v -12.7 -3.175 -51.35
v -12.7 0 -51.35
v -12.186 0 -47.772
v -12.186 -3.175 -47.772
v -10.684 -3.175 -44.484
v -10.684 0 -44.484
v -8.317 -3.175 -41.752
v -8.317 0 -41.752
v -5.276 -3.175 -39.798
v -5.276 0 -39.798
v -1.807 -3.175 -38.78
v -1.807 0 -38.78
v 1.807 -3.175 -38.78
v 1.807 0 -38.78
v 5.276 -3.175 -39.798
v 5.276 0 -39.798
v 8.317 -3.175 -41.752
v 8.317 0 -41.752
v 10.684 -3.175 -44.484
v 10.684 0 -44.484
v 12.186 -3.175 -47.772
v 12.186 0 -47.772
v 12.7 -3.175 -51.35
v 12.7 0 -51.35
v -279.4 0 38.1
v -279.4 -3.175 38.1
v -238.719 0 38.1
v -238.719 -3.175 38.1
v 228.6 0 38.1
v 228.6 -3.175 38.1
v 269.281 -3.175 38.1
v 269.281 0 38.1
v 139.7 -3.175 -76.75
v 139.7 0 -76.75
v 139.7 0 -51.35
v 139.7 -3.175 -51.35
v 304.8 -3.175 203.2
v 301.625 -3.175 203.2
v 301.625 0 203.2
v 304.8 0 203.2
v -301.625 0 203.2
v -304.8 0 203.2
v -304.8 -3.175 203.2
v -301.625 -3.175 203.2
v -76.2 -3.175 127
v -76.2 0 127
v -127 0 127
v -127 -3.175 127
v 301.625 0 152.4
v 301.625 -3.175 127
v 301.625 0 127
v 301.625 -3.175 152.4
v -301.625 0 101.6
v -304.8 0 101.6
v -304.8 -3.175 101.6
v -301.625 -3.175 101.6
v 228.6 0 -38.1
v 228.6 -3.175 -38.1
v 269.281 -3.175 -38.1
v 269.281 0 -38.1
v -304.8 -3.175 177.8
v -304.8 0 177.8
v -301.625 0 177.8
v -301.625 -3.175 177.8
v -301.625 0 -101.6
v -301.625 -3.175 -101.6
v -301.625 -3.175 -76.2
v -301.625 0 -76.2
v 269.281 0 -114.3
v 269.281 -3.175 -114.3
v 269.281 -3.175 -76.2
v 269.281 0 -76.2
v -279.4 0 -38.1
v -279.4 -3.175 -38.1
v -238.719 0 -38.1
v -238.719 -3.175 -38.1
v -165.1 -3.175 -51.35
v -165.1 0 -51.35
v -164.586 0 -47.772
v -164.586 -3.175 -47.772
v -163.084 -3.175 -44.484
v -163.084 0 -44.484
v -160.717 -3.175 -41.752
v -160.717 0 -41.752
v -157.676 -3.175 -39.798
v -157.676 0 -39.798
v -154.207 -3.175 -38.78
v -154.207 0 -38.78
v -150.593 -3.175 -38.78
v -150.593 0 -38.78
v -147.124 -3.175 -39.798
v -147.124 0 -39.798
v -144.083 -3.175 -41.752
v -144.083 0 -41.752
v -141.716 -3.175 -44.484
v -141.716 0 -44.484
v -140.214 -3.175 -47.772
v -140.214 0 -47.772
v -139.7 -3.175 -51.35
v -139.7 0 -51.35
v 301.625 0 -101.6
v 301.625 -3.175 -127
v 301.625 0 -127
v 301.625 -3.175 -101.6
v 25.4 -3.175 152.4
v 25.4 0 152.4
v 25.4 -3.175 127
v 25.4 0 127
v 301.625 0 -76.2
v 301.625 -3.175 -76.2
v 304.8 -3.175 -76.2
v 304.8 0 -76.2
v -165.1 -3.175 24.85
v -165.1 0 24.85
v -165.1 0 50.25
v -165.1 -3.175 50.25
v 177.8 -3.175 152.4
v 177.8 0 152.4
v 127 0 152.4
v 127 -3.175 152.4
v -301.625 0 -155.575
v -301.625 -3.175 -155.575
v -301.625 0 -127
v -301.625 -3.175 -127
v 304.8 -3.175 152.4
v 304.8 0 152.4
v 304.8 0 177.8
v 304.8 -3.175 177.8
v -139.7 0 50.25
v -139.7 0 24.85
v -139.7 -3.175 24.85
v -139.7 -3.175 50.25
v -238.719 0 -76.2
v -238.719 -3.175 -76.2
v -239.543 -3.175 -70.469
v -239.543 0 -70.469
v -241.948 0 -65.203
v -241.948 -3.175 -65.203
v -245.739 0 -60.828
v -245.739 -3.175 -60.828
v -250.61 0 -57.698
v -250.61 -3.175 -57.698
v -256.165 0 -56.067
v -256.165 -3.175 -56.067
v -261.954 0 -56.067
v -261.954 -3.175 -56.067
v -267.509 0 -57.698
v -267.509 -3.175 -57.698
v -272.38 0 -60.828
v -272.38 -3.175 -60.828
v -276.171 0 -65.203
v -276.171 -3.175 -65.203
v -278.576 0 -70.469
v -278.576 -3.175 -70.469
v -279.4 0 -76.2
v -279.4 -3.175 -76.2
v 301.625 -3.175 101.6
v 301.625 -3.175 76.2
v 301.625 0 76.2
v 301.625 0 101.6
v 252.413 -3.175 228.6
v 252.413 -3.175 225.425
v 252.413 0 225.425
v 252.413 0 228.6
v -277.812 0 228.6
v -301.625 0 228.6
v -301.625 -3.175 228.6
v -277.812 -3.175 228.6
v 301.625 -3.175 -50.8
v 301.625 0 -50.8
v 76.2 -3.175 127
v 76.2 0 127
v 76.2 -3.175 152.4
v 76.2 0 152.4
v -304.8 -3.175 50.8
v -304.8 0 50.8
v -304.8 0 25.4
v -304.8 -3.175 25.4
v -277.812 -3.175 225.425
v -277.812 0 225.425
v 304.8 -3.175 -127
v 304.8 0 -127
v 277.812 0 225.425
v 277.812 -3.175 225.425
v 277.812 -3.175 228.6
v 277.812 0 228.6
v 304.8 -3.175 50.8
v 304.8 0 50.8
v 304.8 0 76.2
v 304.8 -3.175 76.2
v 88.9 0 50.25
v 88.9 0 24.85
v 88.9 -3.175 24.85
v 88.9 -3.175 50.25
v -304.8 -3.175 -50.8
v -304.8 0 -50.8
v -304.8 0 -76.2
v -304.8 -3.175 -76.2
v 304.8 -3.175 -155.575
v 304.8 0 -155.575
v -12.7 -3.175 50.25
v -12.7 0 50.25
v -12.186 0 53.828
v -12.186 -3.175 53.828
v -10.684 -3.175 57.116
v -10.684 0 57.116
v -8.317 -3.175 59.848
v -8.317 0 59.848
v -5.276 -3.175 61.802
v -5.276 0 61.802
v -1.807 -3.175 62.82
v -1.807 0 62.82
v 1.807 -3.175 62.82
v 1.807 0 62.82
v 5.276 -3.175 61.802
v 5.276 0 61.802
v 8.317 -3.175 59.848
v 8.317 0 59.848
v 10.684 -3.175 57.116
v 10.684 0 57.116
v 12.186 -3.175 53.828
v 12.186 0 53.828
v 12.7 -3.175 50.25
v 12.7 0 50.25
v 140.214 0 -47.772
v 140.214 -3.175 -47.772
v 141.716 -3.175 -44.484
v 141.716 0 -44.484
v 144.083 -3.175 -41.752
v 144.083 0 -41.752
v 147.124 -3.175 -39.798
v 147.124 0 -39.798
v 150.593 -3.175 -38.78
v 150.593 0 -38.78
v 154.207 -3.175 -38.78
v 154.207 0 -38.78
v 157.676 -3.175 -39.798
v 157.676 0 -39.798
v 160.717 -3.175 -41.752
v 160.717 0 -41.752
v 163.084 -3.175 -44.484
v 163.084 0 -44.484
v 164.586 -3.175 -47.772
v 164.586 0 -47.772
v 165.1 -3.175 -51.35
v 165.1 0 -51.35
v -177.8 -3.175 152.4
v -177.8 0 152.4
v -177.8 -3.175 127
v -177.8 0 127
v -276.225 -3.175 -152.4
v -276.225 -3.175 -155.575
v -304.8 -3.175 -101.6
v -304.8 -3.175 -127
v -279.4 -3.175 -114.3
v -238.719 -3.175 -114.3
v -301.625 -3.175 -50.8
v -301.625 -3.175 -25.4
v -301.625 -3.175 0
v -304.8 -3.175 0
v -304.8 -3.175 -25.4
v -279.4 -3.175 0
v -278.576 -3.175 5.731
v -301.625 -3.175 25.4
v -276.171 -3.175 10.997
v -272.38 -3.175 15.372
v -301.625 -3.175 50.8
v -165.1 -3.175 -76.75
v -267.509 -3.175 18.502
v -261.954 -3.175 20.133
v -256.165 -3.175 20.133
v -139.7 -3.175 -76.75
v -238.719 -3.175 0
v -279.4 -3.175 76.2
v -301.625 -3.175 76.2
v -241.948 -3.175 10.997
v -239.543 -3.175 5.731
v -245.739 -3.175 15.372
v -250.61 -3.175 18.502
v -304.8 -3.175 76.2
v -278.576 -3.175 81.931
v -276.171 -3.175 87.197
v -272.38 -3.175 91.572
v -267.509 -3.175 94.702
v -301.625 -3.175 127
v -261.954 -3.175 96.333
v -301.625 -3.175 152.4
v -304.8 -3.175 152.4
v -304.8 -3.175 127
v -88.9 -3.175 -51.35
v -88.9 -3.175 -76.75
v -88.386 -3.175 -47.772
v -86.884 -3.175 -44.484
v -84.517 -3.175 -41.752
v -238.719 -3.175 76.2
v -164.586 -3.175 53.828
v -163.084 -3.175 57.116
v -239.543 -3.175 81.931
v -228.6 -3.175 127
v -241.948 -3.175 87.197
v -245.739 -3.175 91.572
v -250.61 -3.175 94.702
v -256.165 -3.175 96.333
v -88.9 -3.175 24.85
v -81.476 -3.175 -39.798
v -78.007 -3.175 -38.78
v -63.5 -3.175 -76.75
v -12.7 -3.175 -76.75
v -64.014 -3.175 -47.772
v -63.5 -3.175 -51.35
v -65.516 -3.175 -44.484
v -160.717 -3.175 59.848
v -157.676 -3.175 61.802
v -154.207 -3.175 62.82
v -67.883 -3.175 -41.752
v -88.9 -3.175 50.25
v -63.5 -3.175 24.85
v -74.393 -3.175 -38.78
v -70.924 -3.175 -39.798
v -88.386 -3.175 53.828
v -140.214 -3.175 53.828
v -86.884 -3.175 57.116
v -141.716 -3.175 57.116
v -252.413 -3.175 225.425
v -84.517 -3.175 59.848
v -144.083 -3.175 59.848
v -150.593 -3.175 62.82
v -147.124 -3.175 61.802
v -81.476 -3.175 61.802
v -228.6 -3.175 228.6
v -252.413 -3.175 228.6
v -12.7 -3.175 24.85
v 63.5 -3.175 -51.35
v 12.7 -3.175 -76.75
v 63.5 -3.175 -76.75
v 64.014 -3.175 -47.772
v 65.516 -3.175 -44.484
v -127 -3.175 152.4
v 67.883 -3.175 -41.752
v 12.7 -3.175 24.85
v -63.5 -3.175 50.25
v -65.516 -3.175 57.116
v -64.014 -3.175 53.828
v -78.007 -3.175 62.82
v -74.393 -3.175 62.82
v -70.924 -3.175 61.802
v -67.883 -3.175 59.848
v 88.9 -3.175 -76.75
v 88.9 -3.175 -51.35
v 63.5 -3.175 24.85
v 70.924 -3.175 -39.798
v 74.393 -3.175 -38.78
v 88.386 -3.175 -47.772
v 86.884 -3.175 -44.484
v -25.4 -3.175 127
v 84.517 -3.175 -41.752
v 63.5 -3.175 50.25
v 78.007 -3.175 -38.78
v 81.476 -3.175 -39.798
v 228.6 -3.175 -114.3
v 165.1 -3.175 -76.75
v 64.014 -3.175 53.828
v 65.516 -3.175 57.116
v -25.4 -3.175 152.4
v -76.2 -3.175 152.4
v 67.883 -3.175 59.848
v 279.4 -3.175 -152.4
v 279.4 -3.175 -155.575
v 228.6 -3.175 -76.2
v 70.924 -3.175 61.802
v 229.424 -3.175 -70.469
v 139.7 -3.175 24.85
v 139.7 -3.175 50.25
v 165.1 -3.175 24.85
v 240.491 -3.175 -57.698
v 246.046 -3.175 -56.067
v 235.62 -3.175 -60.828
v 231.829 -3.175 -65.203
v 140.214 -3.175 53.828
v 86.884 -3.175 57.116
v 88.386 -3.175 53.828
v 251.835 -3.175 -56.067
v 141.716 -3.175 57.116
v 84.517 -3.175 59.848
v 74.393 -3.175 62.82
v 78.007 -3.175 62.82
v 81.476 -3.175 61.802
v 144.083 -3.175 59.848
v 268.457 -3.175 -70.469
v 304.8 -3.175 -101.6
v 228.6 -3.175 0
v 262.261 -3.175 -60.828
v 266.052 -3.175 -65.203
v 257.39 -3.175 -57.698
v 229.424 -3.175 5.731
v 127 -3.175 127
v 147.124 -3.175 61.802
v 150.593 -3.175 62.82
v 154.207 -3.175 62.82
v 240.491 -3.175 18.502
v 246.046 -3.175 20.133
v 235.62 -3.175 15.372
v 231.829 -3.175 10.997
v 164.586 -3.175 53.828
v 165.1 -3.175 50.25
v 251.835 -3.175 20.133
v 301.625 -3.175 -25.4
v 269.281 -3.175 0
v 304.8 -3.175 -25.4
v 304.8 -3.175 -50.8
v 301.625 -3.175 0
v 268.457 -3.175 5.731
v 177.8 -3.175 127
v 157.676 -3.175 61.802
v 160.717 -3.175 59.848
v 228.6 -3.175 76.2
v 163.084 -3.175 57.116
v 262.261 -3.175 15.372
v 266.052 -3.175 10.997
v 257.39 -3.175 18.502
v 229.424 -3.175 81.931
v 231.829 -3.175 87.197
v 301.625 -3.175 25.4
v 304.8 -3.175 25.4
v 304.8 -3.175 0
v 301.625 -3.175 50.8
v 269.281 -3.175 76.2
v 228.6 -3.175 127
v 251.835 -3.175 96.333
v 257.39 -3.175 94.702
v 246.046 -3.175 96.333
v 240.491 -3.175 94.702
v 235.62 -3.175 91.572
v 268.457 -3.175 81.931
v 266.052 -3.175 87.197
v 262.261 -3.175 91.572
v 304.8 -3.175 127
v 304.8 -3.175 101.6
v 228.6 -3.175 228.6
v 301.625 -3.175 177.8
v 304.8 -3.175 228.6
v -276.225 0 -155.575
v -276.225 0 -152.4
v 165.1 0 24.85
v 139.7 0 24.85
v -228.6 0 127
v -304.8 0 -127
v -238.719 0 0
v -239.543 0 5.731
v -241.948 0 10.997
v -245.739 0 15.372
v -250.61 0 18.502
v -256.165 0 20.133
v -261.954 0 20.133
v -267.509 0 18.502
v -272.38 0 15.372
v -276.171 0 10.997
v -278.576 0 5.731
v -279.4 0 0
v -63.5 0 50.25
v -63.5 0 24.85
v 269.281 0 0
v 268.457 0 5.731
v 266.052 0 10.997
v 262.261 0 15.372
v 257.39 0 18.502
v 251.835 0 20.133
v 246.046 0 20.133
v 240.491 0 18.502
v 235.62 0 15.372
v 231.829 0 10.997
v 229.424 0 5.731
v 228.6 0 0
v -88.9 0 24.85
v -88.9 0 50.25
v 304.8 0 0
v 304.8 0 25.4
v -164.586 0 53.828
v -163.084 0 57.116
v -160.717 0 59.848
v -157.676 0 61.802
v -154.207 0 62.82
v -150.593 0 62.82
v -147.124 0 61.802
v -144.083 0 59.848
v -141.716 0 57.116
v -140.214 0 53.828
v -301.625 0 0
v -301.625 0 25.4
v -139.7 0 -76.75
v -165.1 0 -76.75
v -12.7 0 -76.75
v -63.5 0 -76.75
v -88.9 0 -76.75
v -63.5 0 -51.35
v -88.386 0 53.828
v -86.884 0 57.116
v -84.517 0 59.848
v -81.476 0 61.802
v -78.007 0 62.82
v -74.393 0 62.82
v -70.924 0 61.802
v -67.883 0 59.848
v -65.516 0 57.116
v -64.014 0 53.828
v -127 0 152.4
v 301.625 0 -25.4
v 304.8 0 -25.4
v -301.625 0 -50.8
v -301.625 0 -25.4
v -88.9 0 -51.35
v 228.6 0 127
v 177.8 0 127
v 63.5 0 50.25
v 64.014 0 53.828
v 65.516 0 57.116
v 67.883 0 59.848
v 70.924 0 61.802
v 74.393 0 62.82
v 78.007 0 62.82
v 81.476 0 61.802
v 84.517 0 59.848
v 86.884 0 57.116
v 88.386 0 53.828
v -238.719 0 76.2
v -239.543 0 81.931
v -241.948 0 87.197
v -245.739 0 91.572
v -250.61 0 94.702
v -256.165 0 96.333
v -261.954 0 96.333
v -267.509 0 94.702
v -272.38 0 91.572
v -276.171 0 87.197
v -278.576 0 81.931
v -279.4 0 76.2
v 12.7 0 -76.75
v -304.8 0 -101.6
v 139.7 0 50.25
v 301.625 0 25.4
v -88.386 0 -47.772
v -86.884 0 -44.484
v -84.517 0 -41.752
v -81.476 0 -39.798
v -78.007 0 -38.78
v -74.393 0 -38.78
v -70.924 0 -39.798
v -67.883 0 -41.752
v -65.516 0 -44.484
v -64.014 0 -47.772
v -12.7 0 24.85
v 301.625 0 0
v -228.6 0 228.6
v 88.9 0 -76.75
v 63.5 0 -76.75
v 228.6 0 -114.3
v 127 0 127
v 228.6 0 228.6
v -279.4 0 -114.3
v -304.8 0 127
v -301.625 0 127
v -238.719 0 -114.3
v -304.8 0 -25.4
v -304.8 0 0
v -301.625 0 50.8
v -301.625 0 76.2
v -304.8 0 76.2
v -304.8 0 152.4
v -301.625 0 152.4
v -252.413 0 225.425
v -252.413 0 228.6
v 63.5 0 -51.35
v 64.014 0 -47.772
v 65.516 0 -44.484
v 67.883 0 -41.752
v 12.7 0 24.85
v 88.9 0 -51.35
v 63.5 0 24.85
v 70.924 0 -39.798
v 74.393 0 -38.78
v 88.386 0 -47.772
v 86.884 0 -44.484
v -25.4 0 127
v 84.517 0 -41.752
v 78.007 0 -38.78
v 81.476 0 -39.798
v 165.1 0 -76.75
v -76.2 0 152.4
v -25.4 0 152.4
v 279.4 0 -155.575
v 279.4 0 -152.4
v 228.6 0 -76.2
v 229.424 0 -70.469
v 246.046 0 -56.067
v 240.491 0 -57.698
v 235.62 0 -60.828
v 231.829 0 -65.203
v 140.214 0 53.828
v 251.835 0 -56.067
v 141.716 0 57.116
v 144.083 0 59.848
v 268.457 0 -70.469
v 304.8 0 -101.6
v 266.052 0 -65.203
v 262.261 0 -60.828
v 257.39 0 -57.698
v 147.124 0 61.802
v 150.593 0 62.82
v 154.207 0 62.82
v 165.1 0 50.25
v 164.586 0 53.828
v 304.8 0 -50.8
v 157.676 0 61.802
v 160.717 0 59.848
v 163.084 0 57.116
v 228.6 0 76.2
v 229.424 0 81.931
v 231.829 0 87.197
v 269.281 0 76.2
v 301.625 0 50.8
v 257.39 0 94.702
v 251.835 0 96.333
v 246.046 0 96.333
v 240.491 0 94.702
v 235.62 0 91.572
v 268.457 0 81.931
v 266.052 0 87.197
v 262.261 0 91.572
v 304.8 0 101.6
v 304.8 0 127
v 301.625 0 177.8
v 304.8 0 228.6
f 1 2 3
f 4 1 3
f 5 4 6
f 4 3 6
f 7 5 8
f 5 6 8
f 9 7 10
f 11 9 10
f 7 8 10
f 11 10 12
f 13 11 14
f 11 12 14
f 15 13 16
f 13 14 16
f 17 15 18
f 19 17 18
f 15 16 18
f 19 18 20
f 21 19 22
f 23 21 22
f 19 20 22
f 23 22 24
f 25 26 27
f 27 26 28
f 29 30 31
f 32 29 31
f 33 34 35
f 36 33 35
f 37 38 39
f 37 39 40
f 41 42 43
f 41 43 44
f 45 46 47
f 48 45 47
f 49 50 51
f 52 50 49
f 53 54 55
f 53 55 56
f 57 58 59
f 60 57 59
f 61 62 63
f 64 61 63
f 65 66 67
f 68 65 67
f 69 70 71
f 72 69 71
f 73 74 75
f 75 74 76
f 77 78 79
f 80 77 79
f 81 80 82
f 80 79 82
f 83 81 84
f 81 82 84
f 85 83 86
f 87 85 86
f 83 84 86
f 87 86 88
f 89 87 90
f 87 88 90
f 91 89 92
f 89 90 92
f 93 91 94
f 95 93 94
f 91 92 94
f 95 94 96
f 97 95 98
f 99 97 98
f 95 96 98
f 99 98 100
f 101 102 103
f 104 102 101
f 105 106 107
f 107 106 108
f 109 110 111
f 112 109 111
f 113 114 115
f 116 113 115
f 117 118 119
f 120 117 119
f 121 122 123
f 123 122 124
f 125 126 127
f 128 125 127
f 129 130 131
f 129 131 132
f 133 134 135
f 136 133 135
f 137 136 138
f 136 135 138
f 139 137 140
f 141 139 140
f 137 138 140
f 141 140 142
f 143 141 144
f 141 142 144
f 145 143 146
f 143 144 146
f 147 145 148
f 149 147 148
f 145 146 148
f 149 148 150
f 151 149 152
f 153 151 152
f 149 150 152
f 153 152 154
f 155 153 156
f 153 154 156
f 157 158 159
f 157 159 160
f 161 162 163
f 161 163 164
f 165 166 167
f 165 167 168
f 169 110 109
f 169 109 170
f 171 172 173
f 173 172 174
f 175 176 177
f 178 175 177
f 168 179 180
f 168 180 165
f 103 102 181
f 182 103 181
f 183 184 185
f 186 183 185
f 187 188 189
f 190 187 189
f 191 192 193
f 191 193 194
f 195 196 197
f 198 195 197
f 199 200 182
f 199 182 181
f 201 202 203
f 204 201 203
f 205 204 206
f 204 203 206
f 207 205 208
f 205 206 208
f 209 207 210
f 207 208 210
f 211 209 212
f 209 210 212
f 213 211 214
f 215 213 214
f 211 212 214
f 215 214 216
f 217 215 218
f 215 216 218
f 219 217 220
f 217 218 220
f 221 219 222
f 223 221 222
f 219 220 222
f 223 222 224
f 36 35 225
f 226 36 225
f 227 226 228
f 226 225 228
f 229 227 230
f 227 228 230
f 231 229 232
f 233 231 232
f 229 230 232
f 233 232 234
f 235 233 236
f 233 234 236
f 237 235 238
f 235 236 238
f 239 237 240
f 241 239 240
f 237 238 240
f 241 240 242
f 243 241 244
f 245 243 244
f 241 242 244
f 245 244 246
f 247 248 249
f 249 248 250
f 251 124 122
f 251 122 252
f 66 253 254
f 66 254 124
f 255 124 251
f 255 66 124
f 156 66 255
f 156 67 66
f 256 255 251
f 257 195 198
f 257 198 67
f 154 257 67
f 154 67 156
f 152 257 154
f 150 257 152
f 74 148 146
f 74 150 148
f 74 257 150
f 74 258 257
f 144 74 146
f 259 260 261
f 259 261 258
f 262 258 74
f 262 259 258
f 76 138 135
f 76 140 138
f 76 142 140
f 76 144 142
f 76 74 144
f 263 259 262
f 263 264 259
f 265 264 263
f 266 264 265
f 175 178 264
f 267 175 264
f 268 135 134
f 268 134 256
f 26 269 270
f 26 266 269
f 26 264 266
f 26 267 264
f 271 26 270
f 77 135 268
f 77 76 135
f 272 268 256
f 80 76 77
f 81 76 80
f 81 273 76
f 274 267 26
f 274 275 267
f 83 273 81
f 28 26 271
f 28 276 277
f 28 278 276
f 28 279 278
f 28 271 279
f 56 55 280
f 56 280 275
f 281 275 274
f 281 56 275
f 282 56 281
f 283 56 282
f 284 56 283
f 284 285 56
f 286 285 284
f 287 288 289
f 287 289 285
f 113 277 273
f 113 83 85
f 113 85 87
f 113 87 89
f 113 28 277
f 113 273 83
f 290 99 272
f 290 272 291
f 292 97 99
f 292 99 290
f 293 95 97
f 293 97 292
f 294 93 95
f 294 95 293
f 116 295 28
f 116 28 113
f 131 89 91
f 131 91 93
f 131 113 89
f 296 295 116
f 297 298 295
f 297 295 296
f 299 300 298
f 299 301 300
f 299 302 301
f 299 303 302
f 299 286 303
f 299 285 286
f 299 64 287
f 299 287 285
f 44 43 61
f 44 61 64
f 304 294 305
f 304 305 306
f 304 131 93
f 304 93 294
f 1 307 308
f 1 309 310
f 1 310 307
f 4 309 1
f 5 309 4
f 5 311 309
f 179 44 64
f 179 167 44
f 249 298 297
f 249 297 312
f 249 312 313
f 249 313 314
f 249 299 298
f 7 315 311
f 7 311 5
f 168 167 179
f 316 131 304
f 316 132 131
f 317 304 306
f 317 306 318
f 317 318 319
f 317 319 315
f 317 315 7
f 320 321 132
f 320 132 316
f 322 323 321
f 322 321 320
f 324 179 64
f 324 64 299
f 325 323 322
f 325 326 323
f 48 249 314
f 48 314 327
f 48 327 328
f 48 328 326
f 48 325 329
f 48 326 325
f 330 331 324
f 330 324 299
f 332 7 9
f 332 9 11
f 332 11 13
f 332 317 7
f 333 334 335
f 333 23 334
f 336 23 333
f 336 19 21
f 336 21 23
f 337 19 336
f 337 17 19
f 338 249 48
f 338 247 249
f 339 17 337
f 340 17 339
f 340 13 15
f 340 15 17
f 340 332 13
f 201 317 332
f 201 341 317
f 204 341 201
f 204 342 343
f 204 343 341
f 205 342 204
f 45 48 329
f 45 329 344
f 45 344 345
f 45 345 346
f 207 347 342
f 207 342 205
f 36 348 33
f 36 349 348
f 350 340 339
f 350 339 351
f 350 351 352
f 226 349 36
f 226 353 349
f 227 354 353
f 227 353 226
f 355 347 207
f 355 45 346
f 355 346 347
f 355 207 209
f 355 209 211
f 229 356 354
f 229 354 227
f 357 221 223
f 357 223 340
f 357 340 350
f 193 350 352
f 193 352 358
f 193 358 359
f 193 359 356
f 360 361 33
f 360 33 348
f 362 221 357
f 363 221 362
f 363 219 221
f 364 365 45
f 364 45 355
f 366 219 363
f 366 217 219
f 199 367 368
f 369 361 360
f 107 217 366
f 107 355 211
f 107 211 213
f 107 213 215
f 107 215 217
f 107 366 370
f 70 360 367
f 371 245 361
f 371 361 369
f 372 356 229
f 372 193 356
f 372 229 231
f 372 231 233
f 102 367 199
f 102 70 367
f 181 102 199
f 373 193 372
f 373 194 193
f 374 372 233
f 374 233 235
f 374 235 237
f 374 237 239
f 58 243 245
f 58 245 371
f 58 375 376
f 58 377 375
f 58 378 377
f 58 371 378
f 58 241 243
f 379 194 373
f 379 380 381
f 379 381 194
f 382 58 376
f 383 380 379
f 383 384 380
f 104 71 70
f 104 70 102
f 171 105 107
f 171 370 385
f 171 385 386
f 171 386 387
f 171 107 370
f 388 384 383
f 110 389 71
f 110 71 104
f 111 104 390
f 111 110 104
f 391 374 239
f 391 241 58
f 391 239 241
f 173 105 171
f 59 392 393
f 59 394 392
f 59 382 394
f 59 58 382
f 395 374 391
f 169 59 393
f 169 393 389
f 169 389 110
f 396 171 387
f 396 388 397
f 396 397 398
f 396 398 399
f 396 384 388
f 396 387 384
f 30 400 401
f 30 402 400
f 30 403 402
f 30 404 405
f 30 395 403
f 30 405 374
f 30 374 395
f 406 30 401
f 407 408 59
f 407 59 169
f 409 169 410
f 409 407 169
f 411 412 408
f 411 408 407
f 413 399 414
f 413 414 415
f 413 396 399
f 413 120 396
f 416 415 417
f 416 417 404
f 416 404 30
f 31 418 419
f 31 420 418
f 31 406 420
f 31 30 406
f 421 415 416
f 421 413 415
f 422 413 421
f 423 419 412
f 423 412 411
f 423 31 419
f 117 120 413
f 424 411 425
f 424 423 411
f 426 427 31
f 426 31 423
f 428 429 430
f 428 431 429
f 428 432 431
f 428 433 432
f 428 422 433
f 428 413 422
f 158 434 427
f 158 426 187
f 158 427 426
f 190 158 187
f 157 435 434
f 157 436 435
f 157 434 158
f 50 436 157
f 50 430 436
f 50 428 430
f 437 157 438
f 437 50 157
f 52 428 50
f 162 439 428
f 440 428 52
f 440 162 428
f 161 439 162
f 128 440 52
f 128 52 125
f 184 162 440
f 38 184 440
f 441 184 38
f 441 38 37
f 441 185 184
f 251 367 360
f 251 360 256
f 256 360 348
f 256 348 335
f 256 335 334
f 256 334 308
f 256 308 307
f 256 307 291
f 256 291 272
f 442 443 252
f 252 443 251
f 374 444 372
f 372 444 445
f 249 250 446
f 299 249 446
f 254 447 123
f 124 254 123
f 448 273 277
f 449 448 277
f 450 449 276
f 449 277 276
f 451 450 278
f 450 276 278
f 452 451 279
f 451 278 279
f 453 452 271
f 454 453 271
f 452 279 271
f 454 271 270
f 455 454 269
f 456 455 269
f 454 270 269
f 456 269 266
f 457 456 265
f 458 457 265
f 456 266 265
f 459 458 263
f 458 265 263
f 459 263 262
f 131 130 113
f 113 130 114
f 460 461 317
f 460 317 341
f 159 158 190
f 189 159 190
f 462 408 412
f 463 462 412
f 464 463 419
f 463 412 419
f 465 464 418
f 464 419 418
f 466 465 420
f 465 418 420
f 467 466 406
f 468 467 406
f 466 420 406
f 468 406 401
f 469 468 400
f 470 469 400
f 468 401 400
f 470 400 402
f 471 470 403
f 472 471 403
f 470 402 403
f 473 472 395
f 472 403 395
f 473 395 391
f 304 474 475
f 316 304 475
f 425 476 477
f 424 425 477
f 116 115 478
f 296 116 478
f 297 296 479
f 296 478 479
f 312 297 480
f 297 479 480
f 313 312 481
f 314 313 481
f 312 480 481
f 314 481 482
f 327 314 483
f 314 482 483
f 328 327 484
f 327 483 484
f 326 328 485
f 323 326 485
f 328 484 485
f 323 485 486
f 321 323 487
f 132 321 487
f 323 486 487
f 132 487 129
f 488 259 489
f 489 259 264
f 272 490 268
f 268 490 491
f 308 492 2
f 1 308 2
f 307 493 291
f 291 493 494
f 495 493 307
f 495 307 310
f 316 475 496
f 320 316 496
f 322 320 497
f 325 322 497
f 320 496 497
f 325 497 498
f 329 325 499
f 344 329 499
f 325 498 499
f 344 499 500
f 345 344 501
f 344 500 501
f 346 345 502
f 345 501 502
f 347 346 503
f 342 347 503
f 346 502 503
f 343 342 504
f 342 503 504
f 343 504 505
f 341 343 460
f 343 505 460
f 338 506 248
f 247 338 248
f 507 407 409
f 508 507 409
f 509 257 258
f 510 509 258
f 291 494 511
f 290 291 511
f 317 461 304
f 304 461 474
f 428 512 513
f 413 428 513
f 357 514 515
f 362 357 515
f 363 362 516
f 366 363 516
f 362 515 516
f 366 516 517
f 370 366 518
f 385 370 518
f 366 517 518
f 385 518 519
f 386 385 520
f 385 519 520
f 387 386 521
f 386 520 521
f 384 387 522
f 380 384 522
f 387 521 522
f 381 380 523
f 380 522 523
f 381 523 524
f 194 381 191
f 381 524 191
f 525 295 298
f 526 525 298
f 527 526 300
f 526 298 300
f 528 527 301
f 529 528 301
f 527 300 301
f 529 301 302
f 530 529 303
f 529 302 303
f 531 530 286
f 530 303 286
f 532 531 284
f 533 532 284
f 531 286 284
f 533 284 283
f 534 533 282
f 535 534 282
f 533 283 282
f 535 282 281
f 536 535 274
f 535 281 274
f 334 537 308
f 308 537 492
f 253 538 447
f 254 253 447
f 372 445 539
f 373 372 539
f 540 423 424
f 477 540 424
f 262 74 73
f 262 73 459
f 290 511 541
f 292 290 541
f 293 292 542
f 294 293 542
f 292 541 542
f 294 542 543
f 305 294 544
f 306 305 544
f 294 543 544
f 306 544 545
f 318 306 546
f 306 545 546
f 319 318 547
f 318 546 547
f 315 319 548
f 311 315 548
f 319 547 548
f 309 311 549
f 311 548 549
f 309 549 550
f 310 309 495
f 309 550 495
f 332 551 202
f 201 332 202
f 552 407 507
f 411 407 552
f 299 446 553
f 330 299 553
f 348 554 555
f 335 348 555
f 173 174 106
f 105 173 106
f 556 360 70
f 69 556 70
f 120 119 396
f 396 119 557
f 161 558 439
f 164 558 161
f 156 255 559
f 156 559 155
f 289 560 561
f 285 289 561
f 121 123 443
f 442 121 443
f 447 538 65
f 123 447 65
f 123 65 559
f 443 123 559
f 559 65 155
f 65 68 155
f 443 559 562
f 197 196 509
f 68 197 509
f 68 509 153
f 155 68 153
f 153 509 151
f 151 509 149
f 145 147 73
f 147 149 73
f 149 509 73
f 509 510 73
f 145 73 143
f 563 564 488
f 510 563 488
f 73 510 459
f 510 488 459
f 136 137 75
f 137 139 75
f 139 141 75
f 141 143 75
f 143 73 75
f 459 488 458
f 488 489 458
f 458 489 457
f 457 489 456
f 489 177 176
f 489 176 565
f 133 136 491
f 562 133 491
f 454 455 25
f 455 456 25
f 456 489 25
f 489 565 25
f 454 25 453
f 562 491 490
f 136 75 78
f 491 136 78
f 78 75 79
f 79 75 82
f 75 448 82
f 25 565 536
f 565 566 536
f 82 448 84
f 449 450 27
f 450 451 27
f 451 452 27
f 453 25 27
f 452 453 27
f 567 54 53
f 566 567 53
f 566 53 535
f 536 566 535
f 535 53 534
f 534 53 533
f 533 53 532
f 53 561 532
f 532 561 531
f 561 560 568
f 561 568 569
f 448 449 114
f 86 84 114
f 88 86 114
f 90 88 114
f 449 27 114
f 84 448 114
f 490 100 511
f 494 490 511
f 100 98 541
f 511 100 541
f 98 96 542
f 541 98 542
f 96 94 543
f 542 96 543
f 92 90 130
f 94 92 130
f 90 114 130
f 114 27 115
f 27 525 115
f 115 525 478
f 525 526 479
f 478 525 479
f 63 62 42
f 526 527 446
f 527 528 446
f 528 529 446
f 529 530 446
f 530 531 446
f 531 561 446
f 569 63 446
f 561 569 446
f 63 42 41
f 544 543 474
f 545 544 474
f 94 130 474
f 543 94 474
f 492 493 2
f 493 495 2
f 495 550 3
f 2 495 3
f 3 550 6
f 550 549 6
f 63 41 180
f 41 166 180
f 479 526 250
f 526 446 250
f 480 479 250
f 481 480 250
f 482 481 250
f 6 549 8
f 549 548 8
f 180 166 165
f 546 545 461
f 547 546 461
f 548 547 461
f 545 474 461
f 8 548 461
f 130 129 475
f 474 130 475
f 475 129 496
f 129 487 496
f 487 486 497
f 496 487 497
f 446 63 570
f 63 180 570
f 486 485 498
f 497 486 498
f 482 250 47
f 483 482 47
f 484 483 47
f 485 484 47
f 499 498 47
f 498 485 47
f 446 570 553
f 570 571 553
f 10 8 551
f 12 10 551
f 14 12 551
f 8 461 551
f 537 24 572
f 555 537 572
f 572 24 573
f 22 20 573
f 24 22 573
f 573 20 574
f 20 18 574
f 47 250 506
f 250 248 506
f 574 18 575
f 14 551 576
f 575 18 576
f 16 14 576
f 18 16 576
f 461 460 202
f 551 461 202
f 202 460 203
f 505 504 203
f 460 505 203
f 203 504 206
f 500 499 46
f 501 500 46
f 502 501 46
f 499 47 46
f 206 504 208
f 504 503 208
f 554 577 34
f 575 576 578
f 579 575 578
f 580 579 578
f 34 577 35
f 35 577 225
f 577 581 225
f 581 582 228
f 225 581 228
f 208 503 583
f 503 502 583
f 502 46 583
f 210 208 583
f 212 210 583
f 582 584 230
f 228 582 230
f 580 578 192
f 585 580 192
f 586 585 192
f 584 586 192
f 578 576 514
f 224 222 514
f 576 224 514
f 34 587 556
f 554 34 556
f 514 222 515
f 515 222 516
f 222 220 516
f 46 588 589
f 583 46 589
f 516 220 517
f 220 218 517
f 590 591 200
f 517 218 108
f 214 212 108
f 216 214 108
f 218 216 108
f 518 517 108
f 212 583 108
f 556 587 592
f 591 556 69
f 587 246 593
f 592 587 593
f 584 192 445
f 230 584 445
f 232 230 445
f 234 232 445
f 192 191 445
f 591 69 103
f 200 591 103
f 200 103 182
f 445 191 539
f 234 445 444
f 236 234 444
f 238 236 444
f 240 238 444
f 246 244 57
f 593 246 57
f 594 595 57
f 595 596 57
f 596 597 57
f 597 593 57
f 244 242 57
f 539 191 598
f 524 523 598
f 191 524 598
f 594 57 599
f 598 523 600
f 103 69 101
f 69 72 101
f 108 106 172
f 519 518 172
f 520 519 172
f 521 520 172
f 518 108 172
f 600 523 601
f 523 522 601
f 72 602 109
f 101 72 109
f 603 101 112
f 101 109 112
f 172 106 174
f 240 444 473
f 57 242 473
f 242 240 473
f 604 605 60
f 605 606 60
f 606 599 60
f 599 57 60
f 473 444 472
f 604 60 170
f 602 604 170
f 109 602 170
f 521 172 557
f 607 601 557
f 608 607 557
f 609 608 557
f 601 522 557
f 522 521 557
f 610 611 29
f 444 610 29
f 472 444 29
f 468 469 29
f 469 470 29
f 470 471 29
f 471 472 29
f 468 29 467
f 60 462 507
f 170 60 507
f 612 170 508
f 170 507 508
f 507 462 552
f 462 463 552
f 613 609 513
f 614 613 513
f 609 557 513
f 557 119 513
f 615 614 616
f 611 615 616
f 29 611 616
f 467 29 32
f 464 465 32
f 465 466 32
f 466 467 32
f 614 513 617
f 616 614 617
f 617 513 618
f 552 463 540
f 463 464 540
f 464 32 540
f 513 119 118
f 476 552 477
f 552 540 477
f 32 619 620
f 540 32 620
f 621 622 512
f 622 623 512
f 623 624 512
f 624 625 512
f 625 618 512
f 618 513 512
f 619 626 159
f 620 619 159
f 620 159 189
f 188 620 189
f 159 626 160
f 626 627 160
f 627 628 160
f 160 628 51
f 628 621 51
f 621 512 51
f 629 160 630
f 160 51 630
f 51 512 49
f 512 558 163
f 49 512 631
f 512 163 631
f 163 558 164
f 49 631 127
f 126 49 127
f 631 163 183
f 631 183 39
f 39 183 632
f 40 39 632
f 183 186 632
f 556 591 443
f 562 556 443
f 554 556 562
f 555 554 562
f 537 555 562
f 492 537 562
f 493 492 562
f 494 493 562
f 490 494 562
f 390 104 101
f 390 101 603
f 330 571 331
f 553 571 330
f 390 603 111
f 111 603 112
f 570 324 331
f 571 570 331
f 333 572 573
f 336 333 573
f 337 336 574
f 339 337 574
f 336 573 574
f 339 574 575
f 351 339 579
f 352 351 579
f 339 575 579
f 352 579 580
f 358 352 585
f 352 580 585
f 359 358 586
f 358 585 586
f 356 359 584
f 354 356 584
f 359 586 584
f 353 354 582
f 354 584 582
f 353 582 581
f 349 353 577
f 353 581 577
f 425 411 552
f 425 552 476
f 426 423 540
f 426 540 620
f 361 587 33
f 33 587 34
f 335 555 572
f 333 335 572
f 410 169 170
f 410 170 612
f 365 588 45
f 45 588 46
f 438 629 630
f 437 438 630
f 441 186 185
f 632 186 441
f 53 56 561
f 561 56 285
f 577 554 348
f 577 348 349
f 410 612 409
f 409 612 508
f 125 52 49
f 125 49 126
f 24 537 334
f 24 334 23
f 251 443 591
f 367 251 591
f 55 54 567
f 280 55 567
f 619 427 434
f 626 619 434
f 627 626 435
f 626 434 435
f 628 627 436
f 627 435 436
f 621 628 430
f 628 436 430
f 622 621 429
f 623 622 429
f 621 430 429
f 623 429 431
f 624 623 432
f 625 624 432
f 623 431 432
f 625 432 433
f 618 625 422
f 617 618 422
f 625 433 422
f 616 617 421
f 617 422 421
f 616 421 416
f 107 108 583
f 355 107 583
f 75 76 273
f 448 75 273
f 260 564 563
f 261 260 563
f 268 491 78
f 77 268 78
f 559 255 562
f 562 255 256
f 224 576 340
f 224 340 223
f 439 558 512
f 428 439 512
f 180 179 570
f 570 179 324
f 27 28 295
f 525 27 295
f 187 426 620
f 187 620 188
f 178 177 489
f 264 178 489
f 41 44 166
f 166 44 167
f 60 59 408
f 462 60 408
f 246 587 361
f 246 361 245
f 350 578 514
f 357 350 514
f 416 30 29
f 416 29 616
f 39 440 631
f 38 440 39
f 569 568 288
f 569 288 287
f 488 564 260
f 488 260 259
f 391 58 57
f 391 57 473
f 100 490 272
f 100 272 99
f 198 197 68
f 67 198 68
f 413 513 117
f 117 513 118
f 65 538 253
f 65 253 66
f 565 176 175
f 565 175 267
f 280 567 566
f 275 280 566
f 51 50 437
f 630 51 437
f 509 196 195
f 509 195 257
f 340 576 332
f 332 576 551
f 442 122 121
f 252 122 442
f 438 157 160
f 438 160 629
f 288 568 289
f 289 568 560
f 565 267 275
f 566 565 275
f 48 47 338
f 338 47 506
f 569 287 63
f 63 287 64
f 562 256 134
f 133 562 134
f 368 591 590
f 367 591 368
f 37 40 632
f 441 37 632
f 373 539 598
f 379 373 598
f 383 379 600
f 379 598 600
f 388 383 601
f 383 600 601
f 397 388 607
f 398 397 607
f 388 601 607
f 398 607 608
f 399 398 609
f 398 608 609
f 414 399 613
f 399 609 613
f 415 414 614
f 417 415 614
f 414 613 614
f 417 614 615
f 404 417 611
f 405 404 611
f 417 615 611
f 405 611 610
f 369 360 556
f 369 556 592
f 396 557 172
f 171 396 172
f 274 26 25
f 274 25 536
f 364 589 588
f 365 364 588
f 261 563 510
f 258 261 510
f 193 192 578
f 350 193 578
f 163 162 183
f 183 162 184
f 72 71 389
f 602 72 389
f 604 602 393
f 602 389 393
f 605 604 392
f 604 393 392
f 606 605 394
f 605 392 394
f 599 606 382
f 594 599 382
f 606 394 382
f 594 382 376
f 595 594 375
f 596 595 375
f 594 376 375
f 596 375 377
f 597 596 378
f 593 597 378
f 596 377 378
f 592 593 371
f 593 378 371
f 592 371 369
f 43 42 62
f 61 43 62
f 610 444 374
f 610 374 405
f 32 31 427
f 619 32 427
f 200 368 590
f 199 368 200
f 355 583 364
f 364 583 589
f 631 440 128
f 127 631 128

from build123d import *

# Parameters (mm, degrees)
F0_W      = 76.2
F0_H      = 76.2
F1_DEPTH  = 3.175
F2_W      = 3.175
F2_H      = 25.4
F3_DEPTH  = 25.4
F4_DEPTH  = 25.4
F5_DEPTH  = 25.4
F6_W      = 40.680845
F6_H      = 38.1
F7_DEPTH  = 25.4
F8_W      = 25.4
F8_H      = 25.4
F9_DEPTH  = 25.4
F10_W     = 25.4
F10_H     = 3.175
F11_DEPTH = 3.175
F12_W     = 25.4
F12_H     = 3.175
F13_DEPTH = 25.4


with BuildPart() as f1:
    # F0 (on Front) → F1 (new body)
    with BuildSketch(Plane.XZ):
        with Locations((-266.7, 190.5)):
            Rectangle(F0_W, F0_H)
        Polygon((-228.6, 152.4), (-304.8, 152.4), (-304.8, -152.4), (304.8, -152.4), (304.8, 152.4), (228.6, 152.4), (228.6, 127), (177.8, 127), (177.8, 152.4), (127, 152.4), (127, 127), (76.2, 127), (76.2, 152.4), (25.4, 152.4), (25.4, 127), (-25.4, 127), (-25.4, 152.4), (-76.2, 152.4), (-76.2, 127), (-127, 127), (-127, 152.4), (-177.8, 152.4), (-177.8, 127), (-228.6, 127), align=None)
        with Locations((266.7, 190.5)):
            Rectangle(F0_W, F0_H)
    extrude(amount=F1_DEPTH)

    # F2 (on face) → F3 (cut)
    with BuildSketch(Plane.XZ.offset(3.175)):
        with Locations((-303.2125, 114.3)):
            Rectangle(F2_W, F2_H)
        with Locations((303.2125, 190.5)):
            Rectangle(F2_W, F2_H)
        with Locations((-303.2125, 63.5)):
            Rectangle(F2_W, F2_H)
        with Locations((-303.2125, 12.7)):
            Rectangle(F2_W, F2_H)
        with Locations((-303.2125, -38.1)):
            Rectangle(F2_W, F2_H)
        with Locations((-303.2125, -88.9)):
            Rectangle(F2_W, F2_H)
        with Locations((-303.2125, -139.7)):
            Rectangle(F2_W, F2_H)
    extrude(amount=-F3_DEPTH, mode=Mode.SUBTRACT)

    # F2 (on face) → F4 (cut)
    with BuildSketch(Plane.XZ.offset(3.175)):
        with Locations((-303.2125, 114.3)):
            Rectangle(F2_W, F2_H)
        with Locations((303.2125, 190.5)):
            Rectangle(F2_W, F2_H)
        with Locations((-303.2125, 165.1)):
            Rectangle(F2_W, F2_H)
        with Locations((-303.2125, 215.9)):
            Rectangle(F2_W, F2_H)
    extrude(amount=-F4_DEPTH, mode=Mode.SUBTRACT)

    # F2 (on face) → F5 (cut)
    with BuildSketch(Plane.XZ.offset(3.175)):
        with Locations((303.2125, 139.7)):
            Rectangle(F2_W, F2_H)
        with Locations((303.2125, 88.9)):
            Rectangle(F2_W, F2_H)
        with Locations((303.2125, 38.1)):
            Rectangle(F2_W, F2_H)
        with Locations((303.2125, -12.7)):
            Rectangle(F2_W, F2_H)
        with Locations((303.2125, -63.5)):
            Rectangle(F2_W, F2_H)
        with Locations((303.2125, -114.3)):
            Rectangle(F2_W, F2_H)
    extrude(amount=-F5_DEPTH, mode=Mode.SUBTRACT)

    # F6 (on face) → F7 (cut)
    with BuildSketch(Plane.XZ.offset(3.175)):
        with BuildLine():
            ThreePointArc((-238.719155, 76.2), (-259.059577, 96.540423), (-279.4, 76.2))
            Line((-279.4, 76.2), (-238.719155, 76.2))
        make_face()
        with Locations((-259.059577, 57.15)):
            Rectangle(F6_W, F6_H)
        with BuildLine():
            ThreePointArc((-238.719155, 0), (-259.059577, 20.340423), (-279.4, 0))
            Line((-279.4, 0), (-238.719155, 0))
        make_face()
        with Locations((-259.059577, -19.05)):
            Rectangle(F6_W, F6_H)
        with BuildLine():
            ThreePointArc((-238.719155, -76.2), (-259.059577, -55.859577), (-279.4, -76.2))
            Line((-279.4, -76.2), (-238.719155, -76.2))
        make_face()
        with Locations((-259.059577, -95.25)):
            Rectangle(F6_W, F6_H)
        with BuildLine():
            ThreePointArc((269.280845, 76.2), (248.940423, 96.540423), (228.6, 76.2))
            Line((228.6, 76.2), (269.280845, 76.2))
        make_face()
        with Locations((248.940423, 57.15)):
            Rectangle(F6_W, F6_H)
        with BuildLine():
            ThreePointArc((269.280845, 0), (248.940423, 20.340423), (228.6, 0))
            Line((228.6, 0), (269.280845, 0))
        make_face()
        with Locations((248.940423, -19.05)):
            Rectangle(F6_W, F6_H)
        with BuildLine():
            ThreePointArc((269.280845, -76.2), (248.940423, -55.859577), (228.6, -76.2))
            Line((228.6, -76.2), (269.280845, -76.2))
        make_face()
        with Locations((248.940423, -95.25)):
            Rectangle(F6_W, F6_H)
    extrude(amount=-F7_DEPTH, mode=Mode.SUBTRACT)

    # F8 (on face) → F9 (cut)
    with BuildSketch(Plane(origin=(0, 0, 0), x_dir=(-1, 0, 0), z_dir=(0, 1, 0))):
        with BuildLine():
            ThreePointArc((-139.7, 50.249674), (-152.4, 62.949674), (-165.1, 50.249674))
            Line((-165.1, 50.249674), (-139.7, 50.249674))
        make_face()
        with Locations((-152.4, 37.549674)):
            Rectangle(F8_W, F8_H)
        with BuildLine():
            Line((-165.1, -51.350326), (-139.7, -51.350326))
            ThreePointArc((-139.7, -51.350326), (-152.4, -38.650326), (-165.1, -51.350326))
        make_face()
        with Locations((-152.4, -64.050326)):
            Rectangle(F8_W, F8_H)
        with BuildLine():
            Line((-88.9, 50.249674), (-63.5, 50.249674))
            ThreePointArc((-63.5, 50.249674), (-76.2, 62.949674), (-88.9, 50.249674))
        make_face()
        with Locations((-76.2, 37.549674)):
            Rectangle(F8_W, F8_H)
        with BuildLine():
            Line((-88.9, -51.350326), (-63.5, -51.350326))
            ThreePointArc((-63.5, -51.350326), (-76.2, -38.650326), (-88.9, -51.350326))
        make_face()
        with Locations((-76.2, -64.050326)):
            Rectangle(F8_W, F8_H)
        with BuildLine():
            Line((-12.7, 50.249674), (12.7, 50.249674))
            ThreePointArc((12.7, 50.249674), (0, 62.949674), (-12.7, 50.249674))
        make_face()
        with Locations((0, 37.549674)):
            Rectangle(F8_W, F8_H)
        with BuildLine():
            Line((-12.7, -51.350326), (12.7, -51.350326))
            ThreePointArc((12.7, -51.350326), (0, -38.650326), (-12.7, -51.350326))
        make_face()
        with Locations((0, -64.050326)):
            Rectangle(F8_W, F8_H)
        with BuildLine():
            Line((63.5, 50.249674), (88.9, 50.249674))
            ThreePointArc((88.9, 50.249674), (76.2, 62.949674), (63.5, 50.249674))
        make_face()
        with Locations((76.2, 37.549674)):
            Rectangle(F8_W, F8_H)
        with BuildLine():
            Line((63.5, -51.350326), (88.9, -51.350326))
            ThreePointArc((88.9, -51.350326), (76.2, -38.650326), (63.5, -51.350326))
        make_face()
        with Locations((76.2, -64.050326)):
            Rectangle(F8_W, F8_H)
        with BuildLine():
            Line((139.7, 50.249674), (165.1, 50.249674))
            ThreePointArc((165.1, 50.249674), (152.4, 62.949674), (139.7, 50.249674))
        make_face()
        with Locations((152.4, 37.549674)):
            Rectangle(F8_W, F8_H)
        with BuildLine():
            Line((139.7, -51.350326), (165.1, -51.350326))
            ThreePointArc((165.1, -51.350326), (152.4, -38.650326), (139.7, -51.350326))
        make_face()
        with Locations((152.4, -64.050326)):
            Rectangle(F8_W, F8_H)
    extrude(amount=-F9_DEPTH, mode=Mode.SUBTRACT)

    # F10 (on face) → F11 (join)
    with BuildSketch(Plane(origin=(0, 0, -152.4), x_dir=(1, 0, 0), z_dir=(0, 0, -1))):
        with Locations((292.1, 1.5875)):
            Rectangle(F10_W, F10_H)
        with Locations((-288.925, 1.5875)):
            Rectangle(F10_W, F10_H)
    extrude(amount=F11_DEPTH)

    # F12 (on face) → F13 (cut)
    with BuildSketch(Plane.XZ.offset(3.175)):
        with Locations((-265.1125, 227.0125)):
            Rectangle(F12_W, F12_H)
        with Locations((265.1125, 227.0125)):
            Rectangle(F12_W, F12_H)
    extrude(amount=-F13_DEPTH, mode=Mode.SUBTRACT)


solid = f1.part
